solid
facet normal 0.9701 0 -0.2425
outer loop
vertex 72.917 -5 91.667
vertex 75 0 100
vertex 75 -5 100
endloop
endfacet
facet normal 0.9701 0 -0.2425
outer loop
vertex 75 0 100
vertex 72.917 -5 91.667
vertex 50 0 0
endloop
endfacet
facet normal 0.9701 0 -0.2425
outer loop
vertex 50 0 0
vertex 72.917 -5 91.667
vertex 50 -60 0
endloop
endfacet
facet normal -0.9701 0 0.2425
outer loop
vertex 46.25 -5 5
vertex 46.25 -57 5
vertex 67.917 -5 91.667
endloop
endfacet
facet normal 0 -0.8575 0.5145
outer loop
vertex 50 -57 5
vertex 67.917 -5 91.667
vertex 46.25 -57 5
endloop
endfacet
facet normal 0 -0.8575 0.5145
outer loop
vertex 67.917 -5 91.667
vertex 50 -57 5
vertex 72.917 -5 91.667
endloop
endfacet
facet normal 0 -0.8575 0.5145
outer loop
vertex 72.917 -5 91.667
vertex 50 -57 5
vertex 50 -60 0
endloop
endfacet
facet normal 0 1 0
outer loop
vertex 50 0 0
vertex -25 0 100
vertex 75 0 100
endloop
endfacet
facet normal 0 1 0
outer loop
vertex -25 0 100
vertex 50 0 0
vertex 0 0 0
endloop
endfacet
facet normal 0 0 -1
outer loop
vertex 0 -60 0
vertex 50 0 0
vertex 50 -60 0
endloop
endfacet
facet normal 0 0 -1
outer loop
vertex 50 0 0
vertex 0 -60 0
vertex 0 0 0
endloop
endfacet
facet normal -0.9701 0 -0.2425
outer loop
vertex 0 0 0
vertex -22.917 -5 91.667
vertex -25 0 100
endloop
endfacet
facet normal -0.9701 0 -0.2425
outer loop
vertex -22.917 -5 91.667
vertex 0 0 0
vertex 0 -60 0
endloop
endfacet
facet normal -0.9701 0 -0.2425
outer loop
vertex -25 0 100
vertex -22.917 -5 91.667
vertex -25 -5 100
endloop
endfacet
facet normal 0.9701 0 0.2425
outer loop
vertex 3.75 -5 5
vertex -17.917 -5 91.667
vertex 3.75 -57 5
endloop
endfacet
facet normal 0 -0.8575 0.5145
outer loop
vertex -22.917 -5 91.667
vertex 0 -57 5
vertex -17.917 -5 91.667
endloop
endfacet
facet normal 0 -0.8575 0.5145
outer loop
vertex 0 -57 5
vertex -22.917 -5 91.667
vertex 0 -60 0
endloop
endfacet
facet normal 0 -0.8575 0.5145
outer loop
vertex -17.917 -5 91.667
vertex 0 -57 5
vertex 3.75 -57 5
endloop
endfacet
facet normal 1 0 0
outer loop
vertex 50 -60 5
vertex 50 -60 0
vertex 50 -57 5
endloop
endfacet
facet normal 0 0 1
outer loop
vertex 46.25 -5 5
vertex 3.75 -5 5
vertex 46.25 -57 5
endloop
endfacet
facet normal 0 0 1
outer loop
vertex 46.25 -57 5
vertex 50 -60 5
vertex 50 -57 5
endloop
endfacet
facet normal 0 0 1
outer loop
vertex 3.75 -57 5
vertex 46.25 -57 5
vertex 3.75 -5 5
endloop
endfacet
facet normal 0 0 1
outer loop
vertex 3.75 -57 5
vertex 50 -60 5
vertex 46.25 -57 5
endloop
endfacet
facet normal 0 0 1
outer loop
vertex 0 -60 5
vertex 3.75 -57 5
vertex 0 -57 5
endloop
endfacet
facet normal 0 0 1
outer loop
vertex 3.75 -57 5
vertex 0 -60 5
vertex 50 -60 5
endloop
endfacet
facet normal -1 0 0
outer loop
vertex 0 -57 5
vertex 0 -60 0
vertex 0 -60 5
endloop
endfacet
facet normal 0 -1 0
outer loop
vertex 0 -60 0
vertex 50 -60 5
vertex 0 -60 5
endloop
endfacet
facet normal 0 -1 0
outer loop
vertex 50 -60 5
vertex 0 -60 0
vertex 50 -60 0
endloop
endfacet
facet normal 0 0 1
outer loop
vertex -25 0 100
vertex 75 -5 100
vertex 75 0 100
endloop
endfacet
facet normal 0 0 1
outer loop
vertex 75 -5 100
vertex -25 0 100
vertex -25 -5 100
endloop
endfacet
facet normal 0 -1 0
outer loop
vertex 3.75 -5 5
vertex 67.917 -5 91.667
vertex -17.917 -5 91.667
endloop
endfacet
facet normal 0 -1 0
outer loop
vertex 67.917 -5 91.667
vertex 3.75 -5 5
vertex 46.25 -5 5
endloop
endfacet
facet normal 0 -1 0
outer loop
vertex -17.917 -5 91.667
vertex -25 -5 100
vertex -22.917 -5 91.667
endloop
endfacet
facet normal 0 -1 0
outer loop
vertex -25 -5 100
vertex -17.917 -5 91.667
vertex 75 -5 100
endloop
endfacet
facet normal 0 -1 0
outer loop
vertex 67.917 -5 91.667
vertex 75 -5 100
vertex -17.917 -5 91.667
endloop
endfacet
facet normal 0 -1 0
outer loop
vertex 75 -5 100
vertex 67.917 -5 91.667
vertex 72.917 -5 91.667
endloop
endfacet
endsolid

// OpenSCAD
base_width = 50;
top_width = 100;
height = 100;
depth = 60;
thickness = 5;

module support_face(offset) {
    polyhedron(
        points=[
            [-offset, 0, 0],
            [-offset, -depth, 0],
            [(top_width - base_width) / 2 - offset, 0, height]],
        faces=[[0, 1, 2]]);
}

module support() {
    hull() {
        support_face(0);
        support_face(thickness);
    }
}

module back_face(offset) {
    polyhedron(
        points=[
            [0, -offset, 0],
            [base_width, -offset, 0],
            [base_width / 2 + top_width / 2, -offset, height],
            [-(top_width - base_width) / 2, -offset, height]],
        faces=[[0, 1, 2, 3]]);
}

module back() {
    hull() {
        back_face(0);
        back_face(thickness);
    }
}

union() {
    translate([base_width, 0, 0])
    support();

    mirror([1, 0, 0])
    support();

    translate([0, -depth, 0])
    cube([base_width, depth, thickness]);
    
    back();
}
